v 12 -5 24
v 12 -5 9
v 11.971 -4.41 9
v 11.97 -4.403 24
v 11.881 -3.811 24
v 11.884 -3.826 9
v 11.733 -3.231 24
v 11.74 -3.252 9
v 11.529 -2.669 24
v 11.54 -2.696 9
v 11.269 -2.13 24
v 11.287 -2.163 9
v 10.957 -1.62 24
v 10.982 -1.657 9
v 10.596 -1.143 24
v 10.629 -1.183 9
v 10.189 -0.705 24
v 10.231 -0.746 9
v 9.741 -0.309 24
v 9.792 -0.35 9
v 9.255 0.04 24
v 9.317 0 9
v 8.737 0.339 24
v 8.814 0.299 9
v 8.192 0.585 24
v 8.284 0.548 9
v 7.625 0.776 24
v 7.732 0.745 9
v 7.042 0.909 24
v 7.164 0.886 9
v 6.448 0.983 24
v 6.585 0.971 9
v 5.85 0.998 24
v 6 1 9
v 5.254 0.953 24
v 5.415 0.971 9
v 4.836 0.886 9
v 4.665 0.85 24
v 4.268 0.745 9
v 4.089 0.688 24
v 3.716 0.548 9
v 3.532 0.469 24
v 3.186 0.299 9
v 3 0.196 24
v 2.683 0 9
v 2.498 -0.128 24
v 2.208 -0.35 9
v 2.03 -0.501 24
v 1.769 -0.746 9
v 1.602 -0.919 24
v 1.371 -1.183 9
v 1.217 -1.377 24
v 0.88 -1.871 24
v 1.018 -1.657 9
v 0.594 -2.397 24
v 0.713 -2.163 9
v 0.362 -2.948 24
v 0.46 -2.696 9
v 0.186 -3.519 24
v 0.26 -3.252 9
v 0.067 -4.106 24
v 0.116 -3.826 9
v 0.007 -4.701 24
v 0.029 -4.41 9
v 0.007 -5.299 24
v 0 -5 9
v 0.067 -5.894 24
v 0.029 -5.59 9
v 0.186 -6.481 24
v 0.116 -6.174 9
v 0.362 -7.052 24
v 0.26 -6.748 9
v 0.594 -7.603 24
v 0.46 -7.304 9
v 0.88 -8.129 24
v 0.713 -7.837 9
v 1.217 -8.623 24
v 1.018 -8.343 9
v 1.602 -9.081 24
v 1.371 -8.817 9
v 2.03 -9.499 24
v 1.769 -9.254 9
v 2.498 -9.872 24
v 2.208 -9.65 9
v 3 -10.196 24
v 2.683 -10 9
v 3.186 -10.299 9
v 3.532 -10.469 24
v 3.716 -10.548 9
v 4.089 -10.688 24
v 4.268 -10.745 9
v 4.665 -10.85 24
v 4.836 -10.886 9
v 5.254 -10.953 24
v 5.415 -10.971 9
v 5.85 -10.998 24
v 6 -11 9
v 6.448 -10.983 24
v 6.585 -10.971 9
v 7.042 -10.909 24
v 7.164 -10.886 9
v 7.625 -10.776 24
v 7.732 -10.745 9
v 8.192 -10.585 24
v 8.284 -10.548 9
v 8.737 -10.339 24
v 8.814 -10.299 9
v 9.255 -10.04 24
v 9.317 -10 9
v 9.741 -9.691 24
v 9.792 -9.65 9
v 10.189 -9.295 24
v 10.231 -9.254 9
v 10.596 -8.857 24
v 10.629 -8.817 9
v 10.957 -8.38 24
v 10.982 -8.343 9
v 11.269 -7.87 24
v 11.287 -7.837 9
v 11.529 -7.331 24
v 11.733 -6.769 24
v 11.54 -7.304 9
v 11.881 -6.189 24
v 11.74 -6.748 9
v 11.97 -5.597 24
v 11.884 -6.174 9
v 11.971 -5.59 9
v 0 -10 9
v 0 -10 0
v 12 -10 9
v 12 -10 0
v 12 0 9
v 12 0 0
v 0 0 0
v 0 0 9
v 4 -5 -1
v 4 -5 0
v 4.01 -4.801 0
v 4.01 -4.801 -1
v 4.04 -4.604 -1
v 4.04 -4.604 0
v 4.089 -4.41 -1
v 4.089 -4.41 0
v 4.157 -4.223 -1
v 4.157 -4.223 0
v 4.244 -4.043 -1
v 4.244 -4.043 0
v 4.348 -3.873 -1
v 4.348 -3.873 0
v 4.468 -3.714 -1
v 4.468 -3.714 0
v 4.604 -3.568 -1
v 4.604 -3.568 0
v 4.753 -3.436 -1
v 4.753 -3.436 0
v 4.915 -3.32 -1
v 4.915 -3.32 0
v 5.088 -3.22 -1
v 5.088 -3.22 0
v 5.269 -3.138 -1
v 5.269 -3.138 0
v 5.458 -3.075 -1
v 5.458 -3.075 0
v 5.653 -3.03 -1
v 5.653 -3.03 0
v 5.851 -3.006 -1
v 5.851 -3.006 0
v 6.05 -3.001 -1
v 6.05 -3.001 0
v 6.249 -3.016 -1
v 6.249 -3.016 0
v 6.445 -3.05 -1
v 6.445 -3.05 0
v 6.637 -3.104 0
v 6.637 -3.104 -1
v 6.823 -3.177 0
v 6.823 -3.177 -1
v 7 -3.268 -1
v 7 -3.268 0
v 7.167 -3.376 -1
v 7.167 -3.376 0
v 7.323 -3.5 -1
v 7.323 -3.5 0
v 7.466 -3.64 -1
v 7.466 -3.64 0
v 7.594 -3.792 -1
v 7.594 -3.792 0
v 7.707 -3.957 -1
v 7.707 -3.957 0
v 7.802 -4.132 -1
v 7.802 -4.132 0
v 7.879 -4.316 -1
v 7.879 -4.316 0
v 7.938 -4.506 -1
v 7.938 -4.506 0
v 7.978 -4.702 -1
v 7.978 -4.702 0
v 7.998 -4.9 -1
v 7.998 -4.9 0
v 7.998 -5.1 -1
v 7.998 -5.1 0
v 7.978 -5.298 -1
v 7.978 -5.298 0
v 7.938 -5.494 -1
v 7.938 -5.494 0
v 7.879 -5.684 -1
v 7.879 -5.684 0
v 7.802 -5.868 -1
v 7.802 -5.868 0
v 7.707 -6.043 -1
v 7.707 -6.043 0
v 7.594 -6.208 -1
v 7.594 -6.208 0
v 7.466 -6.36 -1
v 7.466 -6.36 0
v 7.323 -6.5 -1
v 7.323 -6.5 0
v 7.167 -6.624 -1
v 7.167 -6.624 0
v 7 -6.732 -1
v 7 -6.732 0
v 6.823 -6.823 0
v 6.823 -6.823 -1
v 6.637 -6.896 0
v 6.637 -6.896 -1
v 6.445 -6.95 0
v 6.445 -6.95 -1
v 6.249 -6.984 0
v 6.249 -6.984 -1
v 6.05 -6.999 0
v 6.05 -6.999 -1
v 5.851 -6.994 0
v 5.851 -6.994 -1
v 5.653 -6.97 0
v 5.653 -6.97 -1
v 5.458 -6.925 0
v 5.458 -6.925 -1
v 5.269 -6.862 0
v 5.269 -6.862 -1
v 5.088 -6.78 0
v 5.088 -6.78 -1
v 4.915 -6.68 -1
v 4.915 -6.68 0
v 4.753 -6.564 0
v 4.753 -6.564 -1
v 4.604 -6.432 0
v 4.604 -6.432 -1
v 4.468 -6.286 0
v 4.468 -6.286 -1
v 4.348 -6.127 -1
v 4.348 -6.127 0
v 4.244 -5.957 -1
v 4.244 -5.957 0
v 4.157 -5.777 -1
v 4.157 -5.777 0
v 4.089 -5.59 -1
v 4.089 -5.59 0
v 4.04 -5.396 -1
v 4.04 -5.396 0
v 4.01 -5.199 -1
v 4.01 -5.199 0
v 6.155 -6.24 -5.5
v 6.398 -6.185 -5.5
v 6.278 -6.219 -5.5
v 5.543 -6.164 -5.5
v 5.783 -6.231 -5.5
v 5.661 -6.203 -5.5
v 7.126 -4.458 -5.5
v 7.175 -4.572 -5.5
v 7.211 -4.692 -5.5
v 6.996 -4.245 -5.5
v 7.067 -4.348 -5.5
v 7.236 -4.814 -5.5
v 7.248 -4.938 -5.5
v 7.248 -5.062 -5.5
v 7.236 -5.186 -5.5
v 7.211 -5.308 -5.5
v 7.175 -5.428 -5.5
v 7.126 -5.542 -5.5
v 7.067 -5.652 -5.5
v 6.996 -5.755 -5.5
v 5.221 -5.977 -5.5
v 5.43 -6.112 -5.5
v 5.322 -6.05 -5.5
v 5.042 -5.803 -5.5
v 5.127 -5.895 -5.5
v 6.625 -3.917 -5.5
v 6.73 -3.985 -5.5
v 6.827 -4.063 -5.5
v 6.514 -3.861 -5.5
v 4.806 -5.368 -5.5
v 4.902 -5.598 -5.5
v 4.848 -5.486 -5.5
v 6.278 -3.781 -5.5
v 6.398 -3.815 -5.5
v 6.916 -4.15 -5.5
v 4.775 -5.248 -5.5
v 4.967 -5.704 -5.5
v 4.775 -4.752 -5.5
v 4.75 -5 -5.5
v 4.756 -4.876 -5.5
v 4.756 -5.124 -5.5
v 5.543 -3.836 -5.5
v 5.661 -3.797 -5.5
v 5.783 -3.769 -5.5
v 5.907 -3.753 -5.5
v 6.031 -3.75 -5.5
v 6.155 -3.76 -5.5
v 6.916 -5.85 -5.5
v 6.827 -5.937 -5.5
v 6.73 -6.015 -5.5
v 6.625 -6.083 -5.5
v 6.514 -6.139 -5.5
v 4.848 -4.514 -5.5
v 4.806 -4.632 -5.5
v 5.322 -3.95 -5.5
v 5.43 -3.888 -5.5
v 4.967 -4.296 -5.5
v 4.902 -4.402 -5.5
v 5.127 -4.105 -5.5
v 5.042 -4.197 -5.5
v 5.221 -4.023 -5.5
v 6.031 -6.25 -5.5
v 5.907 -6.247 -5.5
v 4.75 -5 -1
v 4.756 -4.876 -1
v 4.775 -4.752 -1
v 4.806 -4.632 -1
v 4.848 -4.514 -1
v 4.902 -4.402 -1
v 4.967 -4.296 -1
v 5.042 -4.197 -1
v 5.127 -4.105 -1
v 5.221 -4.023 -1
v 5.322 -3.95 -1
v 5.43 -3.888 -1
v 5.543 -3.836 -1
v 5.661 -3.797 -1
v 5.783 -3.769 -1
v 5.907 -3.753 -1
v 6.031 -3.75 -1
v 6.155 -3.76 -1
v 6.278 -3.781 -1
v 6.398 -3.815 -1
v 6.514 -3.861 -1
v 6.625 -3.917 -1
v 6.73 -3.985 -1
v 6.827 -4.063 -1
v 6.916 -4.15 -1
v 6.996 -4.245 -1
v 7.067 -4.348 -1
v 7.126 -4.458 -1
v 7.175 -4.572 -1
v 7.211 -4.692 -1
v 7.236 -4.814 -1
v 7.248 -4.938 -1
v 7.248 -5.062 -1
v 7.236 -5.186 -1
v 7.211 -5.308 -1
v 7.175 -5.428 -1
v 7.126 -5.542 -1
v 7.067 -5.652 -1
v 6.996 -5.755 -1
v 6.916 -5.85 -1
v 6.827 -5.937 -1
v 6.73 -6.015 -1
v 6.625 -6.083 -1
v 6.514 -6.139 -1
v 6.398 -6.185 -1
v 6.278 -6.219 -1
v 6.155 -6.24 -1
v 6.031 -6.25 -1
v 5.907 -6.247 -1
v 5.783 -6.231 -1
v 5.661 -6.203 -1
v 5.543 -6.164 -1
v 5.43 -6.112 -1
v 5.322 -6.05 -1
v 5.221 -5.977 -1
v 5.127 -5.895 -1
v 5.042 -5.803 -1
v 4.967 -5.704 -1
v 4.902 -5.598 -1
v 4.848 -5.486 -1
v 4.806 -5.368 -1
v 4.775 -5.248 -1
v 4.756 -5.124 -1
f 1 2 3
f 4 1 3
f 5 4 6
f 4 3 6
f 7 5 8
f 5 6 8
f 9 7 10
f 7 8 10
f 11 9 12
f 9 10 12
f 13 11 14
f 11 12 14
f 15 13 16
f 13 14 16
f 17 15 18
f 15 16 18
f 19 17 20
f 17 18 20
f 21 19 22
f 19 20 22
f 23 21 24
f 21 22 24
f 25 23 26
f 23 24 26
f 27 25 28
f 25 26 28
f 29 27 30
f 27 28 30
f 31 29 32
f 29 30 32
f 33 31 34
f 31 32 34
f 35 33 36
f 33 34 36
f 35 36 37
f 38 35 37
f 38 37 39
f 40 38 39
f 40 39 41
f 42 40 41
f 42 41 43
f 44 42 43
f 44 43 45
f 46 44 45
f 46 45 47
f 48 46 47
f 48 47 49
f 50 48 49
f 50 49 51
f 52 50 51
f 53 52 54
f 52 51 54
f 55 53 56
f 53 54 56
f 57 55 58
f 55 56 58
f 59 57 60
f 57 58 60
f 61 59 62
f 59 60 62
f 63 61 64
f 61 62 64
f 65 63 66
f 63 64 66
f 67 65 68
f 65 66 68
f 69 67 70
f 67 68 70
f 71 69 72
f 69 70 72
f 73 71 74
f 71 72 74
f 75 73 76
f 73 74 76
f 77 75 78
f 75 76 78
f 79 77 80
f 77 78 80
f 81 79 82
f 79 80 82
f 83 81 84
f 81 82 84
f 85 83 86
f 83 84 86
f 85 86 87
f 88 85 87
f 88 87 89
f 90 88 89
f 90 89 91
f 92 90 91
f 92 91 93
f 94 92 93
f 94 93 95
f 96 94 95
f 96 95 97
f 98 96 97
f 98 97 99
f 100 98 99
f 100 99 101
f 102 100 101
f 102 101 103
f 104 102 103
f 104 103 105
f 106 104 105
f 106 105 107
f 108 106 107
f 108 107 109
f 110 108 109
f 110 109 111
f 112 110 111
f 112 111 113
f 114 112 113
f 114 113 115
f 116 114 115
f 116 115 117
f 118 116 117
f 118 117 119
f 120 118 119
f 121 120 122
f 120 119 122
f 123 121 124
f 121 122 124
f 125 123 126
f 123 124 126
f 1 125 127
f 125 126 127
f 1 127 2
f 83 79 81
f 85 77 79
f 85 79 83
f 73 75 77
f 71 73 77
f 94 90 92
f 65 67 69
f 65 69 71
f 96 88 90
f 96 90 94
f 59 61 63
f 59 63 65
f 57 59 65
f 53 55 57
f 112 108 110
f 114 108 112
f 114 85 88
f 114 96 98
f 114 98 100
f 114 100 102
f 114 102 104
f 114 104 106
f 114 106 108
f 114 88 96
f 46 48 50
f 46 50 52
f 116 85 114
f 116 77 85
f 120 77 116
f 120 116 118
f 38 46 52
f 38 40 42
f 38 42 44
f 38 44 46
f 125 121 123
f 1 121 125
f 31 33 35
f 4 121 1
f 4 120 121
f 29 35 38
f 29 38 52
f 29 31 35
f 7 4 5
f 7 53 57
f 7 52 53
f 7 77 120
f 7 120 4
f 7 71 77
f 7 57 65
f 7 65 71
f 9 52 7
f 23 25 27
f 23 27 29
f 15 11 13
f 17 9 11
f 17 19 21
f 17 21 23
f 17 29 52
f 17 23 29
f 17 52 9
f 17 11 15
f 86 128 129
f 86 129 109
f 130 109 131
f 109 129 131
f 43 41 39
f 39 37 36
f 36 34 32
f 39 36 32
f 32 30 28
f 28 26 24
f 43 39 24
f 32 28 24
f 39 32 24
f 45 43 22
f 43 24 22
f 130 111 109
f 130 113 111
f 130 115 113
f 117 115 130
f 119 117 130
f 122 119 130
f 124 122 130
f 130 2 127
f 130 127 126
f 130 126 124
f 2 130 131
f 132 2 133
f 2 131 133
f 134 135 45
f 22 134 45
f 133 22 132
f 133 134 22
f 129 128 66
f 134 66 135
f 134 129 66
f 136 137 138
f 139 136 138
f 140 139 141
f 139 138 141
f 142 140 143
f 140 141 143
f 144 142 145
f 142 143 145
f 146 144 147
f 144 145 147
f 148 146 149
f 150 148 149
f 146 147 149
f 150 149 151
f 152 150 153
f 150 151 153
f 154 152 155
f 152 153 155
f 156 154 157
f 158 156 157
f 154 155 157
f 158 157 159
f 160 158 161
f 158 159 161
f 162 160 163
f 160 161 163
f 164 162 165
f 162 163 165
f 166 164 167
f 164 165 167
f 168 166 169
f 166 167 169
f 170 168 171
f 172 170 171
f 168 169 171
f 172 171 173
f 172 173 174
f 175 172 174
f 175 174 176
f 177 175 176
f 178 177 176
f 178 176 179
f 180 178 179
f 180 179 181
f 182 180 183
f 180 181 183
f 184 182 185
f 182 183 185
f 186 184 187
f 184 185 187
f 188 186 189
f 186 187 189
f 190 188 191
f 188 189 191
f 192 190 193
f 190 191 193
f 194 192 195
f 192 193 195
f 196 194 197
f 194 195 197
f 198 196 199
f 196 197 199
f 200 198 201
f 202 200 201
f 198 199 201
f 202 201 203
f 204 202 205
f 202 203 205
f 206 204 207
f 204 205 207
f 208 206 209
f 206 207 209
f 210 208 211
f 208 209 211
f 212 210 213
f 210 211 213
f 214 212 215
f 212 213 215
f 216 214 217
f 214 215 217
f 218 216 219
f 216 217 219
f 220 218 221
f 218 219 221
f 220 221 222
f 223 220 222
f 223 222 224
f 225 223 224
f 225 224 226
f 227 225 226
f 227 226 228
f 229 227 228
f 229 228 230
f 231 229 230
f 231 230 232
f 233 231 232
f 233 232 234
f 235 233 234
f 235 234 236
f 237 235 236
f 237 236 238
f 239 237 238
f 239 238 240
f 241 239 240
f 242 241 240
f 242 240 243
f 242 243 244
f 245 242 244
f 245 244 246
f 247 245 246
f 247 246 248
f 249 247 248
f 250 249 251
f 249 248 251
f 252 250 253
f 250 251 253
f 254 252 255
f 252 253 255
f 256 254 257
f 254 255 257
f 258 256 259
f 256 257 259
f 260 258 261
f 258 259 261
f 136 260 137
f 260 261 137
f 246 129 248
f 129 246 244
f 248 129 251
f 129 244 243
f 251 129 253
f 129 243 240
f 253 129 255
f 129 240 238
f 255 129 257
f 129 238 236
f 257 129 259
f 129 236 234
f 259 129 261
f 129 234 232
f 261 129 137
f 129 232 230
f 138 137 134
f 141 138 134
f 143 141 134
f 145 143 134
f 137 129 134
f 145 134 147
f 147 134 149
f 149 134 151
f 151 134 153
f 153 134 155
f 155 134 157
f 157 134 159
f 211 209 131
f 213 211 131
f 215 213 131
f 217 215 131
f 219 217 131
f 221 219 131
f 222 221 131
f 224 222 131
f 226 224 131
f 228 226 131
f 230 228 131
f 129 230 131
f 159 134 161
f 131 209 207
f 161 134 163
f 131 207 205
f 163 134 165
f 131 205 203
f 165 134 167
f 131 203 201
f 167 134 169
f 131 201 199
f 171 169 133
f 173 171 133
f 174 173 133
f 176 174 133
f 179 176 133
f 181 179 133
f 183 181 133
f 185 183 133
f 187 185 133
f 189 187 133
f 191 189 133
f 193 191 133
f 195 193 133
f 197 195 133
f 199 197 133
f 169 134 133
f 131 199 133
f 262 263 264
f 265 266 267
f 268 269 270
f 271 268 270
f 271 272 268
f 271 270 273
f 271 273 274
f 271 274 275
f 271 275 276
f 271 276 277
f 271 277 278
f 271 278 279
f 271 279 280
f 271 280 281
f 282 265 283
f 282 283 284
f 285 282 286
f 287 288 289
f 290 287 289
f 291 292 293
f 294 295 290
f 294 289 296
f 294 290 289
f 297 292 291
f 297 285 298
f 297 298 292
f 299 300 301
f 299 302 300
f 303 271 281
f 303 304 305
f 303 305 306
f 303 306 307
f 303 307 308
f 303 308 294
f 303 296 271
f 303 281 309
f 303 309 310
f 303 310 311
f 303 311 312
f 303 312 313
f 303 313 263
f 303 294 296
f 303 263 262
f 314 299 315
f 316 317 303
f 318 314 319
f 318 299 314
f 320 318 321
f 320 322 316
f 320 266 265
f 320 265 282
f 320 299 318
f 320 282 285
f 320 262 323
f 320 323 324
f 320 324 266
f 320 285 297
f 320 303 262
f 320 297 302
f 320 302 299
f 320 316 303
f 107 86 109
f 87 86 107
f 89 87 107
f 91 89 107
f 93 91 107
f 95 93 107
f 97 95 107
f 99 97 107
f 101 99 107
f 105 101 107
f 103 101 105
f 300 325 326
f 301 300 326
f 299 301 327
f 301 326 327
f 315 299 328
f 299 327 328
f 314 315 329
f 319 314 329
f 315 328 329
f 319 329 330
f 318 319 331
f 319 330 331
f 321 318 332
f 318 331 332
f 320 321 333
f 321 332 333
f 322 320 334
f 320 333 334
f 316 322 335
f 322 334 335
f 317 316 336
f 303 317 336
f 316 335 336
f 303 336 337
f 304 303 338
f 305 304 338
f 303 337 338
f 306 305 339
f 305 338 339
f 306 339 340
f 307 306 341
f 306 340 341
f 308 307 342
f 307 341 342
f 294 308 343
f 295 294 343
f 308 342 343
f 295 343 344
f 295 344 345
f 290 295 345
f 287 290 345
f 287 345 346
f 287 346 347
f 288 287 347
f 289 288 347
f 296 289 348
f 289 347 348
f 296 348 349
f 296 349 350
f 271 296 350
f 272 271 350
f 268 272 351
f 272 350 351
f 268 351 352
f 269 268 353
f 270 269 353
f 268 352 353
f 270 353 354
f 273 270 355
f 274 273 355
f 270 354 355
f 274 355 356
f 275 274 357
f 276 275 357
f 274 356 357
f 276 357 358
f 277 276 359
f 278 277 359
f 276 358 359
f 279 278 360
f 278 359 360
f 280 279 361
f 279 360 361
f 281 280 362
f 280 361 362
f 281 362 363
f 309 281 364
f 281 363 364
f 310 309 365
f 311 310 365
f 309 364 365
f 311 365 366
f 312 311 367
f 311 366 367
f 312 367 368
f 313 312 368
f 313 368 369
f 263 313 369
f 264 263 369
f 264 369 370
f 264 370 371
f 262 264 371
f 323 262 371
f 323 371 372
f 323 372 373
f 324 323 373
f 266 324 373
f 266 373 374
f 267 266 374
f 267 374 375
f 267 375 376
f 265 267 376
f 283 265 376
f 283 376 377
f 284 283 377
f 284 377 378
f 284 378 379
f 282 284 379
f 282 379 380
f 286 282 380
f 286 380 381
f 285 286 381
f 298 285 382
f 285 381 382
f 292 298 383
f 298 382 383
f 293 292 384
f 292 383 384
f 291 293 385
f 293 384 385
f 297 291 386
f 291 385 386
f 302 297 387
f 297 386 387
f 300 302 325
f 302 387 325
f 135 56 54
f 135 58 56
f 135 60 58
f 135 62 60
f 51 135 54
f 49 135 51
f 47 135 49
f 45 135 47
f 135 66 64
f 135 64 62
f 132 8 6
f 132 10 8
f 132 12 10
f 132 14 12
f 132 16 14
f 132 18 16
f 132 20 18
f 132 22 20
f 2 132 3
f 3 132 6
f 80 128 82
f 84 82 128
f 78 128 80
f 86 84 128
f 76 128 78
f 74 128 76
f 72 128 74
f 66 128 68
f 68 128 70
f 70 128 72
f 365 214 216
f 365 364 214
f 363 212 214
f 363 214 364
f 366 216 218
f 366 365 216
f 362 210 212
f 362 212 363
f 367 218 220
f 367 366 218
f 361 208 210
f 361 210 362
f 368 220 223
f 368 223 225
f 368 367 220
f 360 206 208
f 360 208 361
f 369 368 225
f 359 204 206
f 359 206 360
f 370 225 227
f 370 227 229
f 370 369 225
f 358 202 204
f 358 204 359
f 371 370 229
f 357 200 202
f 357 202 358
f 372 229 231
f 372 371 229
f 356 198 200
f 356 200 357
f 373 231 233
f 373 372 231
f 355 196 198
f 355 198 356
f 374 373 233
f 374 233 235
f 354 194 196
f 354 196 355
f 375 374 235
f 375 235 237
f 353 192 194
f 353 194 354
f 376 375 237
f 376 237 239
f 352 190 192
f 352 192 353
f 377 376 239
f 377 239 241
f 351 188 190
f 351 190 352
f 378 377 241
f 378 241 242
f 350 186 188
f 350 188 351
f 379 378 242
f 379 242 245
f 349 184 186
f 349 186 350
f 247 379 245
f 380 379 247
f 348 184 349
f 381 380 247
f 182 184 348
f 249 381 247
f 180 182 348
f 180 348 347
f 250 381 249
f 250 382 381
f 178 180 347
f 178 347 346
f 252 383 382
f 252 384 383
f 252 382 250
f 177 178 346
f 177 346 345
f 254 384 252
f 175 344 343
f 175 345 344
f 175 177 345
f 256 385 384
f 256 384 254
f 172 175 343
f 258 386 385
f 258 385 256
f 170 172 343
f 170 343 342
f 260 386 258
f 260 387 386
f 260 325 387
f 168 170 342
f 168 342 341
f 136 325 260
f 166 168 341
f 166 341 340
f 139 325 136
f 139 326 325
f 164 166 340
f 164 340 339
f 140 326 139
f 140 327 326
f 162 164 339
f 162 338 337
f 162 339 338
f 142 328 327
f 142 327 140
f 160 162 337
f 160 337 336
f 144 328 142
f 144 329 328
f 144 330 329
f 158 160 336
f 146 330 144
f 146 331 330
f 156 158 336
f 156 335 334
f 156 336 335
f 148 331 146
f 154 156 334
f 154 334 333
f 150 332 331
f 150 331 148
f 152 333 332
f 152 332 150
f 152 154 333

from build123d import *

# Parameters (mm, degrees)
SKETCH1_W           = 12
SKETCH1_H           = 10
BOSS_EXTRUDE1_DEPTH = 9
SKETCH2_R           = 6
BOSS_EXTRUDE2_DEPTH = 15
SKETCH3_R           = 2
BOSS_EXTRUDE3_DEPTH = 1
SKETCH4_R           = 1.25
BOSS_EXTRUDE4_DEPTH = 4.5


with BuildPart() as part:
    # Sketch1 → Boss-Extrude1 (new body)
    with BuildSketch(Plane.XY):
        with Locations((6, -5)):
            Rectangle(SKETCH1_W, SKETCH1_H)
    extrude(amount=BOSS_EXTRUDE1_DEPTH)

    # Sketch2 → Boss-Extrude2 (add)
    with BuildSketch(Plane.XY.offset(9)):
        with Locations((6, -5)):
            Circle(SKETCH2_R)
    extrude(amount=BOSS_EXTRUDE2_DEPTH)

    # Sketch3 → Boss-Extrude3 (add)
    with BuildSketch(Plane(origin=(0, 0, 0), x_dir=(-1, 0, 0), z_dir=(0, 0, -1))):
        with Locations((-6, -5)):
            Circle(SKETCH3_R)
    extrude(amount=BOSS_EXTRUDE3_DEPTH)

    # Sketch4 → Boss-Extrude4 (add)
    with BuildSketch(Plane(origin=(0, 0, -1), x_dir=(-1, 0, 0), z_dir=(0, 0, -1))):
        with Locations((-6, -5)):
            Circle(SKETCH4_R)
    extrude(amount=BOSS_EXTRUDE4_DEPTH)


solid = part.part
